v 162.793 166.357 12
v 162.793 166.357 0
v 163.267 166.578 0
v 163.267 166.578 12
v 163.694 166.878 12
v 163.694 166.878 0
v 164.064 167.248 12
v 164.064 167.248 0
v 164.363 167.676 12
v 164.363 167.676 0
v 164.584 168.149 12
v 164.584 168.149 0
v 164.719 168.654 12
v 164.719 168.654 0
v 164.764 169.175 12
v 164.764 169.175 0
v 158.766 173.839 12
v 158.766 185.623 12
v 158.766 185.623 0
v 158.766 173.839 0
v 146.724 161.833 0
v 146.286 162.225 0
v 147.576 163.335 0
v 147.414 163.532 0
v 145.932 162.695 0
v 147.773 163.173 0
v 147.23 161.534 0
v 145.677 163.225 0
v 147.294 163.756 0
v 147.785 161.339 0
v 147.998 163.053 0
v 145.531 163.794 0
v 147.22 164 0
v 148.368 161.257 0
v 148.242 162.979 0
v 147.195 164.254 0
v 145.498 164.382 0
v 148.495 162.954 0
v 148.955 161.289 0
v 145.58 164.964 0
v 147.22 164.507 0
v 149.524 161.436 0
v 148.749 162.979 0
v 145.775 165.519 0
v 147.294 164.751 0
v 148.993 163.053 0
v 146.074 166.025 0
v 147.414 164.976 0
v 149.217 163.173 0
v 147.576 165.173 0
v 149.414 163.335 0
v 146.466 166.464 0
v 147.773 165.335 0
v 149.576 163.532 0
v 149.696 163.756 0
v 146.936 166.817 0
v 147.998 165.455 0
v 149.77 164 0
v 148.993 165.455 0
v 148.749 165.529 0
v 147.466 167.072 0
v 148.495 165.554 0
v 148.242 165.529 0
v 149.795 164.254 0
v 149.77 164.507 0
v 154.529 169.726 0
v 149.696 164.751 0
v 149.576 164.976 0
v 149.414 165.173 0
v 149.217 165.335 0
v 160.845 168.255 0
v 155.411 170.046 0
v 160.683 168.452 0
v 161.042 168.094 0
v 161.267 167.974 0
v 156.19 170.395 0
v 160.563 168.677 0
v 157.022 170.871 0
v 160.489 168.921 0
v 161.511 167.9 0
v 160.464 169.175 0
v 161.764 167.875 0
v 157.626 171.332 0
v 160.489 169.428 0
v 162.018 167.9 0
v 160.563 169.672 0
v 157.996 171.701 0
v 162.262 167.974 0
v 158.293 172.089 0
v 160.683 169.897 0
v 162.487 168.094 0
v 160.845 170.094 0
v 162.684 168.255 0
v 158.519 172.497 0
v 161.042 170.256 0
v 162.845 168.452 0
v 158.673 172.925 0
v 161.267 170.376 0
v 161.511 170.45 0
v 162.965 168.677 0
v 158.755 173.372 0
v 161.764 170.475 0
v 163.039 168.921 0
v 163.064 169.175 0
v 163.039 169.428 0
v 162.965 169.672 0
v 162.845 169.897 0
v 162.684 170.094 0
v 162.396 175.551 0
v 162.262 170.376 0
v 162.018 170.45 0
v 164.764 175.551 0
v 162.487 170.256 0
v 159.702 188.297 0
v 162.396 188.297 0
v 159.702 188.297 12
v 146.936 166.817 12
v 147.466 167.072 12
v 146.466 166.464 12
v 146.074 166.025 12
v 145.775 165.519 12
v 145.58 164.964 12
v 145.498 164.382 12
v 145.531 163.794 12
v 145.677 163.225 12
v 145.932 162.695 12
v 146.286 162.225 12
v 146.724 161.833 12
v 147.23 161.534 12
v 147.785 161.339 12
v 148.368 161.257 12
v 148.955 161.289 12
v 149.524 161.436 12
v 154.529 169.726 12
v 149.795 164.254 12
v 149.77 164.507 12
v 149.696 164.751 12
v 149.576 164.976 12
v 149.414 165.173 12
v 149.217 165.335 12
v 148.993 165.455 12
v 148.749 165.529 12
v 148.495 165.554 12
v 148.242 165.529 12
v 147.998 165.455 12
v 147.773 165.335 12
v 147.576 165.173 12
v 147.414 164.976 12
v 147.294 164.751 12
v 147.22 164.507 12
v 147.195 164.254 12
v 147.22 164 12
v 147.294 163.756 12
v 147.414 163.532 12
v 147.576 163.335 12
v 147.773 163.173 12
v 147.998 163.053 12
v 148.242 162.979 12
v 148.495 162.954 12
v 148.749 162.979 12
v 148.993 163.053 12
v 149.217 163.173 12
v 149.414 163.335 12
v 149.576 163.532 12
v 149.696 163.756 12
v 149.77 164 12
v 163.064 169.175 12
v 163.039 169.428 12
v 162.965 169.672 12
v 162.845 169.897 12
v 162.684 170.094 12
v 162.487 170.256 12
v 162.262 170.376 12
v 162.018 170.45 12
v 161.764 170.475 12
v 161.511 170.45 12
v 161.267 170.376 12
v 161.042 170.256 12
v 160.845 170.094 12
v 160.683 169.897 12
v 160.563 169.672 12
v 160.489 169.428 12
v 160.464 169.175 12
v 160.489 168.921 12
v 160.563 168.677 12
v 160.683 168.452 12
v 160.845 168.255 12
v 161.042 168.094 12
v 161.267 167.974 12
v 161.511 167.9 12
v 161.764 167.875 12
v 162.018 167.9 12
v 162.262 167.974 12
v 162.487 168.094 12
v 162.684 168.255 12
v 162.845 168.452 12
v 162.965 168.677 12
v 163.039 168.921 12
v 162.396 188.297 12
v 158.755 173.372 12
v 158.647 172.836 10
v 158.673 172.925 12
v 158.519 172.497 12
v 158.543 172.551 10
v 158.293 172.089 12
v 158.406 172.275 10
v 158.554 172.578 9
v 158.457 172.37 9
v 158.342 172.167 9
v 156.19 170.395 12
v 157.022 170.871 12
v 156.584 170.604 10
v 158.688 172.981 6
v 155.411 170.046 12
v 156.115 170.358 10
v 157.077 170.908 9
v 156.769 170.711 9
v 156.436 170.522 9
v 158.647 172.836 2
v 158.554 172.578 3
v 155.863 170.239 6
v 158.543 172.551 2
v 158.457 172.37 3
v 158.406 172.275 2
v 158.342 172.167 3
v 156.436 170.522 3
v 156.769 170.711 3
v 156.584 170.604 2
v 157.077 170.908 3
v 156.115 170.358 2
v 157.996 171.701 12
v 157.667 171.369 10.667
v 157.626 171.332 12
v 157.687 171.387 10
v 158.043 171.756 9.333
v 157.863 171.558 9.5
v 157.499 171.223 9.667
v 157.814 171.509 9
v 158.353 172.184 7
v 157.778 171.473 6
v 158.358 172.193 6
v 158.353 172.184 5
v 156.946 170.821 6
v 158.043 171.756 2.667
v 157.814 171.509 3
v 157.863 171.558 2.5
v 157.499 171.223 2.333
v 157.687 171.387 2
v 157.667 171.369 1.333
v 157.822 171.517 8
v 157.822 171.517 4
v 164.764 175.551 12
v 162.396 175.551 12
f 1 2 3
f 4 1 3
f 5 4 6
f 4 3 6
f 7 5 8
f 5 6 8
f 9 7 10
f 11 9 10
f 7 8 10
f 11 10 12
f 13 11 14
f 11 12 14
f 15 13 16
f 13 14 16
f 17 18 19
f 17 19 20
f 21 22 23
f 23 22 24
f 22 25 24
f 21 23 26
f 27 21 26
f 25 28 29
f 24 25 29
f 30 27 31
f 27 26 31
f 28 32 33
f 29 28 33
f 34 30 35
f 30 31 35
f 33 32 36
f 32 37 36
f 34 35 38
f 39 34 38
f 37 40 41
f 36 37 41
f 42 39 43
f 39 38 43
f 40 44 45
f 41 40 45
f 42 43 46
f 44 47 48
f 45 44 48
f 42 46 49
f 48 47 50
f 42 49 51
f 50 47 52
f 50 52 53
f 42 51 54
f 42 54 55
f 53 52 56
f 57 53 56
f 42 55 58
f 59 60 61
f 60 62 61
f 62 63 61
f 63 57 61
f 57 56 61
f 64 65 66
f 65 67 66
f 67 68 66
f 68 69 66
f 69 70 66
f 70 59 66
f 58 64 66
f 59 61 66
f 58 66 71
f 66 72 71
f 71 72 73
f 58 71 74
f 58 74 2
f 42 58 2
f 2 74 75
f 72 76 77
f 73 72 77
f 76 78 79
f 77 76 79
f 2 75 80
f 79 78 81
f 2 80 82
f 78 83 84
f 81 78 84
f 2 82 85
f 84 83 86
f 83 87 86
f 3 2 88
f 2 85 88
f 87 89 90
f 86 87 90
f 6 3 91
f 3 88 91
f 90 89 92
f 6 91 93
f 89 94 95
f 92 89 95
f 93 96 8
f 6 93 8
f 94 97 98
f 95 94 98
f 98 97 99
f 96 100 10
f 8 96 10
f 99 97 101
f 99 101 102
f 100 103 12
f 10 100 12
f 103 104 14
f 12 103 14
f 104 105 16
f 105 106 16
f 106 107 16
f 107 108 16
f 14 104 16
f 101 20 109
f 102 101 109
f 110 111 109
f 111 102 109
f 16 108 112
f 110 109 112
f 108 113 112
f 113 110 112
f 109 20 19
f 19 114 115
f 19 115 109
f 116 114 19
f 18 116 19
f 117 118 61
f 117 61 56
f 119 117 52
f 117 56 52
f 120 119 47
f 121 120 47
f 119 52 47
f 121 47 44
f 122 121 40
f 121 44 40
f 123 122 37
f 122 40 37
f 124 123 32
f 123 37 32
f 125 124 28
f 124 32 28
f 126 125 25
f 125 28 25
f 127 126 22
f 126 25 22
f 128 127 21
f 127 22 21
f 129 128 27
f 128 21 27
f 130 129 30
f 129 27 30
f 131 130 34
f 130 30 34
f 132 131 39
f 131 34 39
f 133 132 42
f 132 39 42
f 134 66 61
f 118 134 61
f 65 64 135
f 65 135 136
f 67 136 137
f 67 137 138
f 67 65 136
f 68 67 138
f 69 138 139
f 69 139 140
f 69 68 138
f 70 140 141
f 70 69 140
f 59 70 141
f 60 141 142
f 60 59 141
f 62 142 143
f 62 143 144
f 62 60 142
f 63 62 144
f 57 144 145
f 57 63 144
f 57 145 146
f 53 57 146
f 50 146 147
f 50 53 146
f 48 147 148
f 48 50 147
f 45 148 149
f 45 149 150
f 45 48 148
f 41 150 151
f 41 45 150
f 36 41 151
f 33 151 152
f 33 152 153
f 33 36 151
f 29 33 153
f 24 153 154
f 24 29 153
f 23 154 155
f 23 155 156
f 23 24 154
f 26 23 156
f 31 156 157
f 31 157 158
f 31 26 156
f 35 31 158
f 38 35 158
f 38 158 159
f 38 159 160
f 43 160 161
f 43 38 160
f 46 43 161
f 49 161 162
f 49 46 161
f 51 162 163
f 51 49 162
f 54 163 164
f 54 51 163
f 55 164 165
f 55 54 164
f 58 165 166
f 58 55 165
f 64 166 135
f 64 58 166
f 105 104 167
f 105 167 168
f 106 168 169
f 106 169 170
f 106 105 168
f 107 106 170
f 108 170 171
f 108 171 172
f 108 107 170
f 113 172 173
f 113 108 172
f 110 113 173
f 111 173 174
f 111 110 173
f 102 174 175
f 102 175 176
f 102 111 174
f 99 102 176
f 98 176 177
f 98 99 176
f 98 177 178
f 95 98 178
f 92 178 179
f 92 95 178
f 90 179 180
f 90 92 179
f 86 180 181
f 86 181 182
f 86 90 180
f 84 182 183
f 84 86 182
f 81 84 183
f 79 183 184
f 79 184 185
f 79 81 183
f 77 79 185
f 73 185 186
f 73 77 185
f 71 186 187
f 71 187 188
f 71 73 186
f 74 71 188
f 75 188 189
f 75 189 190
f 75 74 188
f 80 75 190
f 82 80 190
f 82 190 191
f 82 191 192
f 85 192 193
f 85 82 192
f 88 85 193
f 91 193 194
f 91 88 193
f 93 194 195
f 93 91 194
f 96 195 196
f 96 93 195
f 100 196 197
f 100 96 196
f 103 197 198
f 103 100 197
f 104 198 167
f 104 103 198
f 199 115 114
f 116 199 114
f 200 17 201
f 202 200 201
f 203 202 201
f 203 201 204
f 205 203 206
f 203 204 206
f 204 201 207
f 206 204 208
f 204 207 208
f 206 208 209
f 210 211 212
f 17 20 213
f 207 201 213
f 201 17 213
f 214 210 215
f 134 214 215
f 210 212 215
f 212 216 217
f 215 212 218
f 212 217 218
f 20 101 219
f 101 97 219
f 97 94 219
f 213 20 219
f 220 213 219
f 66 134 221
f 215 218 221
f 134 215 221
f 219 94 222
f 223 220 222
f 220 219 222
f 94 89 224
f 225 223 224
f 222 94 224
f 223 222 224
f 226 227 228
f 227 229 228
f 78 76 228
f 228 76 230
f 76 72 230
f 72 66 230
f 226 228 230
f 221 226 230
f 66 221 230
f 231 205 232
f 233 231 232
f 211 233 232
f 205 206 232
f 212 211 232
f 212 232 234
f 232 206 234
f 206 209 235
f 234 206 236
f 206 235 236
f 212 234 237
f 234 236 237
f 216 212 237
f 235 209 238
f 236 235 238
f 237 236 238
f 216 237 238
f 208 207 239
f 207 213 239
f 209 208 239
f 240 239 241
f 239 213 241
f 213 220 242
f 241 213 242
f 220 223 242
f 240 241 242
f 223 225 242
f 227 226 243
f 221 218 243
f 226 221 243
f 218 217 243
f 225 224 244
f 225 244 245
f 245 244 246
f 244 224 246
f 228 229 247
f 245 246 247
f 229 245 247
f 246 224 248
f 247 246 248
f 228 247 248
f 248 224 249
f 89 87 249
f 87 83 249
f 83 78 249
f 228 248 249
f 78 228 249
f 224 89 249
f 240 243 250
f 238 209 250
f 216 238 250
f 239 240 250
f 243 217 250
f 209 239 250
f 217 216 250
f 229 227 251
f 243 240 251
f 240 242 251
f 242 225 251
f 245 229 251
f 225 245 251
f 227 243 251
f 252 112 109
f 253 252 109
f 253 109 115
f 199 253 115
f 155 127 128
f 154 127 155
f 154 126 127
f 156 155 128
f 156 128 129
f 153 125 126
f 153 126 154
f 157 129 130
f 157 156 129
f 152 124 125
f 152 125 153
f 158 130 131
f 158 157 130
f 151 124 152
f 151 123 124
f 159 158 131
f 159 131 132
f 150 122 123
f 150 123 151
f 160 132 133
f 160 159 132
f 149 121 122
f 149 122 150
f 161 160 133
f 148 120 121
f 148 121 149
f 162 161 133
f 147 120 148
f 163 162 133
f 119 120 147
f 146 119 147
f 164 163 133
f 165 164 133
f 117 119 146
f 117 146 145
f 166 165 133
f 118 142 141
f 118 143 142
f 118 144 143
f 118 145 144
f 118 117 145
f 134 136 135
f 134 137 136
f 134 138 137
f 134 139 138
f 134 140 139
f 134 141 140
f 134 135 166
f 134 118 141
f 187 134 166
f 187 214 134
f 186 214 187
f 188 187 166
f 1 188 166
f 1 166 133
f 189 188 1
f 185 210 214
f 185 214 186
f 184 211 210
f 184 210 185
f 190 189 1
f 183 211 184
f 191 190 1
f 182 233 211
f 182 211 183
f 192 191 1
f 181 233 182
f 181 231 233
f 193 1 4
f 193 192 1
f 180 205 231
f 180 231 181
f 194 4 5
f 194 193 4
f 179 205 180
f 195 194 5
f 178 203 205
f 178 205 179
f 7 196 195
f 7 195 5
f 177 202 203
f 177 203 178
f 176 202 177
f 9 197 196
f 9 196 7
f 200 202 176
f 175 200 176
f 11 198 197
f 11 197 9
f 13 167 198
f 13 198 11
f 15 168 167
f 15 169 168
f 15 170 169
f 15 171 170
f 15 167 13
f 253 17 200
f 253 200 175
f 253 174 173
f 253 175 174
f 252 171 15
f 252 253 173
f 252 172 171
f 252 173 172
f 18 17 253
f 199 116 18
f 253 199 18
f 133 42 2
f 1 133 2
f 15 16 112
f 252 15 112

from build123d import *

# Parameters (mm, degrees)
ESQUISSE1_R        = 1.3
BOSS_EXTRU_1_DEPTH = 12


with BuildPart() as part:
    # Esquisse1 → Boss.-Extru.1 (new body)
    with BuildSketch(Plane.XY):
        with BuildLine():
            Line((159.701668195, 188.296706066), (158.766015625, 185.623295296))
            Line((158.766015625, 185.623295296), (158.766015625, 173.839174165))
            add(Edge.make_bspline(
                [(158.766015625, 173.839174165), (158.908011503, 171.16248829), (154.528686771, 169.726069)],
                knots=[0, 0, 0, 1, 1, 1], degree=2))
            Line((154.528686771, 169.726069), (147.466091463, 167.071838941))
            ThreePointArc((147.466091463, 167.071838941), (145.677207205, 163.224776021), (149.524270126, 161.435891763))
            Line((149.524270126, 161.435891763), (162.793418929, 166.356678901))
            ThreePointArc((162.793418929, 166.356678901), (164.222709959, 167.45524387), (164.764329598, 169.17465249))
            Line((164.764329598, 169.17465249), (164.764329598, 175.550568138))
            Line((164.764329598, 175.550568138), (162.39595917, 175.550568138))
            Line((162.39595917, 175.550568138), (162.39595917, 188.296706066))
            Line((162.39595917, 188.296706066), (159.701668195, 188.296706066))
        make_face()
        with Locations((148.495180794, 164.253865352)):
            Circle(ESQUISSE1_R, mode=Mode.SUBTRACT)
        with Locations((161.764329598, 169.17465249)):
            Circle(ESQUISSE1_R, mode=Mode.SUBTRACT)
    extrude(amount=BOSS_EXTRU_1_DEPTH)


solid = part.part
